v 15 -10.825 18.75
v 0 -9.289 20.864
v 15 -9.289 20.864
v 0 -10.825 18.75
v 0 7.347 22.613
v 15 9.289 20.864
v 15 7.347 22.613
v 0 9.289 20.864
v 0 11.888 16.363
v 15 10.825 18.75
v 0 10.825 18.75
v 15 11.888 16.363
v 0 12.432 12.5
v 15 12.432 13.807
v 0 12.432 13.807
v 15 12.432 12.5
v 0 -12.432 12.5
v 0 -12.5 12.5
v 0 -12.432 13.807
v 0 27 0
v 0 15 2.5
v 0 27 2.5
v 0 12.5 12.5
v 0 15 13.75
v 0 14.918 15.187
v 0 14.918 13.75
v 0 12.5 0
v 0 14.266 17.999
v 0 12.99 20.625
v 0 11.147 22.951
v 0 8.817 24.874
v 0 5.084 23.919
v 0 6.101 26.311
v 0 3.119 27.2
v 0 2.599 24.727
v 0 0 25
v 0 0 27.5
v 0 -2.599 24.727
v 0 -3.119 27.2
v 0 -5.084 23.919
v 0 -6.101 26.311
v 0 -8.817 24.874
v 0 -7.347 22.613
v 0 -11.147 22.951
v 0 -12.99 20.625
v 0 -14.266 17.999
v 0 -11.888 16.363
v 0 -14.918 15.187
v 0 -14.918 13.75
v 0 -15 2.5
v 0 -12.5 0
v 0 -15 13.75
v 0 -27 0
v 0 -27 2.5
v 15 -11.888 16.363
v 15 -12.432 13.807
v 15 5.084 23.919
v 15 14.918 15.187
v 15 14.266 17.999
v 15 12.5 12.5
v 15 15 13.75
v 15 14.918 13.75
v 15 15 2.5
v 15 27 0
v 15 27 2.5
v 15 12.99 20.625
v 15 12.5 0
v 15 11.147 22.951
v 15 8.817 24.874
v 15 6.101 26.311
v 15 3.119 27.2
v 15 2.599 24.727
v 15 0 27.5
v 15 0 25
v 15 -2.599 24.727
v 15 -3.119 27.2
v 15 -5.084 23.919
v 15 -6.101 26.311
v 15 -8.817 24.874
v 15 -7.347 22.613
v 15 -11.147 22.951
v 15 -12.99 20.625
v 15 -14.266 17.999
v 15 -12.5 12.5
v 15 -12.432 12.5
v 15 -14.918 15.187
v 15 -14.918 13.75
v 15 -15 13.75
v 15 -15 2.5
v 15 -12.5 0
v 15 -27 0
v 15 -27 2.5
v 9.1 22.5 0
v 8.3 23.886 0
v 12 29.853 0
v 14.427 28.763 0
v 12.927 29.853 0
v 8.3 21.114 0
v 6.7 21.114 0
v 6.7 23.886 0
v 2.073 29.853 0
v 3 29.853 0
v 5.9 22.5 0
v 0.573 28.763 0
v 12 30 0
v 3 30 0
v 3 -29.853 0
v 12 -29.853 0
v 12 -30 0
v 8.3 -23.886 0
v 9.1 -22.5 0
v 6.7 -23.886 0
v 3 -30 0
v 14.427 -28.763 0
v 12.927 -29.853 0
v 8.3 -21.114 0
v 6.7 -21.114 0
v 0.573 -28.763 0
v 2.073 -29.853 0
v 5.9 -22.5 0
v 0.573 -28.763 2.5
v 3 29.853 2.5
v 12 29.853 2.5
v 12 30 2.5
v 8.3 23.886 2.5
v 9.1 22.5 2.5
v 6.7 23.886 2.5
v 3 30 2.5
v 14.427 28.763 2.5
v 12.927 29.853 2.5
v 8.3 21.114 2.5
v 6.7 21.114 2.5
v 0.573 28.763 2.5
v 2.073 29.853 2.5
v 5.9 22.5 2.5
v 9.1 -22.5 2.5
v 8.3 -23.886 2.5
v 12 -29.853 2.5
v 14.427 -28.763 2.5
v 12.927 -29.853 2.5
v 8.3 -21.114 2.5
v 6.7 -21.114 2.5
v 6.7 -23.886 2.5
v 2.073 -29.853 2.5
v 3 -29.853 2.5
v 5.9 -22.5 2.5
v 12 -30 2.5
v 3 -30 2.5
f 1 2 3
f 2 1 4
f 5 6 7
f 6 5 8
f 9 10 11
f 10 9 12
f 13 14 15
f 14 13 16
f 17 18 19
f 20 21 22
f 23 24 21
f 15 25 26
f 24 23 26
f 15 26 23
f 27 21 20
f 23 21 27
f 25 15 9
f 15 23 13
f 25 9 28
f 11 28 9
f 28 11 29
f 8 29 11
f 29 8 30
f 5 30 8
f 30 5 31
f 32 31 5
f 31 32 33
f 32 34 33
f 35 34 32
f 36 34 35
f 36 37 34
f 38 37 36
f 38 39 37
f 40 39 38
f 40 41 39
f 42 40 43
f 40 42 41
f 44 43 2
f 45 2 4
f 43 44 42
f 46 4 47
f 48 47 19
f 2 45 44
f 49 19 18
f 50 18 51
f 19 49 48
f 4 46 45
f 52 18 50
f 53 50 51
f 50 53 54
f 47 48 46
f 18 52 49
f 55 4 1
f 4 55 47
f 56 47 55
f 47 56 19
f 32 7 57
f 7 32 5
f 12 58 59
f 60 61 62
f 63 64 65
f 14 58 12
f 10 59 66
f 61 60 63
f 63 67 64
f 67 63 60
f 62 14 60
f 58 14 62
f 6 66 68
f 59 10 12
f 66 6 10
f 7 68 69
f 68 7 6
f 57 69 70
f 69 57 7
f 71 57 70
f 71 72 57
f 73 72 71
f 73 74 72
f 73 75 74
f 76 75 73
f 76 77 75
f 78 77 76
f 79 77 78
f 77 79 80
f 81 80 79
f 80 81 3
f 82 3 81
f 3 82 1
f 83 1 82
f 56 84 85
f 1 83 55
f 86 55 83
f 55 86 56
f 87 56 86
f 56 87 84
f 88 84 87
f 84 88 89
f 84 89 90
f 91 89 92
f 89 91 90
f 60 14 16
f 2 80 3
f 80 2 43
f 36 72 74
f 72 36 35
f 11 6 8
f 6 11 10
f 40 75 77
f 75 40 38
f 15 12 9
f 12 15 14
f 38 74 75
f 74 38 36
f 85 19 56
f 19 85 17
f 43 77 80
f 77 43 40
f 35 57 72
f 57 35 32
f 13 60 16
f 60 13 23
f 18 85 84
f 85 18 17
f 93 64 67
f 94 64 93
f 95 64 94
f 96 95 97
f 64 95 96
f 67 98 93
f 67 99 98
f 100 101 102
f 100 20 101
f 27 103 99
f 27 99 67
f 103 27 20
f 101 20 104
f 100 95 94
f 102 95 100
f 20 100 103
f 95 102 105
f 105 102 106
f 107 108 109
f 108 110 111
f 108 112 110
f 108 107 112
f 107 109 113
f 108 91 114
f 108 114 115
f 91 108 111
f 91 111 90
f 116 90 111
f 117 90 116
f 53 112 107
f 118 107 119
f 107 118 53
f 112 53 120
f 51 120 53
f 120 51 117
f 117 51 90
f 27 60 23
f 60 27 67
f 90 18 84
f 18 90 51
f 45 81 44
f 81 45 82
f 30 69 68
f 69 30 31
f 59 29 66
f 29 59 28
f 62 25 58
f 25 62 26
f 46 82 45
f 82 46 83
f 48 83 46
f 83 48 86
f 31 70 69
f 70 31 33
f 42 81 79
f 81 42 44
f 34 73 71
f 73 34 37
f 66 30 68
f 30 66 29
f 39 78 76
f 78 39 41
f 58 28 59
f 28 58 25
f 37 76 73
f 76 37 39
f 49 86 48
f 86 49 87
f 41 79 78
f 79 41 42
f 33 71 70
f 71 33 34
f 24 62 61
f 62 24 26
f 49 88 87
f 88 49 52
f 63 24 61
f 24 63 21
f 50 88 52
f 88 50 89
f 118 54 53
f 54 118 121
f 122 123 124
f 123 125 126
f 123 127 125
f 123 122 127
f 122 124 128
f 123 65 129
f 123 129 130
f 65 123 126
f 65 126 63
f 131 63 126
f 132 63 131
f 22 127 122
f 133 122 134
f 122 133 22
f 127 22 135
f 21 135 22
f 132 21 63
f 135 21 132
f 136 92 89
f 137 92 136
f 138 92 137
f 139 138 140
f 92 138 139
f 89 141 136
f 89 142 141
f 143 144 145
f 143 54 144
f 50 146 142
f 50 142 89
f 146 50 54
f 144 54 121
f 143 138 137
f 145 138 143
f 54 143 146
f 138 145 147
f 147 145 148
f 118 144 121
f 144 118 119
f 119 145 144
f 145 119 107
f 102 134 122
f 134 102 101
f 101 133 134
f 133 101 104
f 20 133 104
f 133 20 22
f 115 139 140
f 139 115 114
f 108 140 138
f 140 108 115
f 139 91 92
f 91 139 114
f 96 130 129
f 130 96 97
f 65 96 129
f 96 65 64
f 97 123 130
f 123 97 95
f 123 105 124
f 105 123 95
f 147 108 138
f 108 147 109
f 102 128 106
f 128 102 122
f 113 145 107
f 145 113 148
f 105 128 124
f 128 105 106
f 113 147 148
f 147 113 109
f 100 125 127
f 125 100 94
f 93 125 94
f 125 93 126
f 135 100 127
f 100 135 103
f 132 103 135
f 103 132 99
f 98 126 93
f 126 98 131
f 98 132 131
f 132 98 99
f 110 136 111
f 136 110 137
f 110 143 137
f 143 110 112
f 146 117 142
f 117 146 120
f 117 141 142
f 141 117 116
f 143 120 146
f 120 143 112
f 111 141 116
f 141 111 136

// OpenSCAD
// file: utils.scad
module mirror_copy(v = [1,0,0]) {
    children();
    mirror(v) {
        children();
    }
}

module rounded_rect(size, r, center=false) {
    module _shape() {
        hull() {
            translate([r, r]) circle(r);
            translate([size.x - r, r]) circle(r);
            translate([r, size.y - r]) circle(r);
            translate([size.x - r, size.y - r]) circle(r);
        }
    }
    if (!center)
        _shape();
    else 
        translate([-size.x/2, -size.y/2]) _shape();
}
// file: params.scad
e = 0.01;  // epsilon
m3_d = 3.2;  // hole diameter for an M3 screw
corner_r = 3; // corner radius

plate_thickness = 4;
// positions of the wheel/motor mountings (not the wheels themselves)
back_wheel_pos = [53, 0];
front_wheel_pos = [52.25, 172.78];

// Widths on the plate are measured from the main axis => they are halved!

// the back plate on which the motors and back wheels are mounted;
// needs to be long enough for the wheels to fit
back_plate_length = 36*2;
// the plate on which the battery is mounted
middle_plate_width = 75;
// width of the cutout behind and in front of the front wheels for them to
// steer freely
steering_cutout_width = 35;
battery_width = 32;

motor_d = 25;
motor_len = 47.8;
motor_holder_len = 15;
motor_holder_screw_hole_margin = (motor_holder_len - m3_d) / 2;
motor_bracket_thickness = 2.5;
// main file
include <params.scad>
use <utils.scad>
use <MCAD/boxes.scad>

thickness = motor_bracket_thickness;
screw_hole_margin = motor_holder_screw_hole_margin;

// a cube with a cylinder on top
module _base_solid_shape() {
    translate([0, 0, motor_d/2]) rotate([0, 90, 0]) cylinder(d = motor_d, h = motor_holder_len);
    translate([0, -motor_d/2, 0]) cube([motor_holder_len, motor_d, motor_d/2]);
}

// obtain a shell by subtracting two scaled copies of _base_solid_shape
// (TODO: would using cylinder_tube from MCAD/regular_shapes be simpler?)
difference() {
    union() {
        resize([motor_holder_len, motor_d+thickness*2, motor_d+thickness]) _base_solid_shape();

        // feet
        translate([motor_holder_len/2, 0, thickness/2])
            roundedBox(
                [motor_holder_len, motor_d + 2*(thickness + m3_d + 2*screw_hole_margin), thickness],
                radius = corner_r,
                sidesonly = true
            );
    }

    _base_solid_shape();
    // screw holes
    mirror_copy([0,1,0])
        translate([
            motor_holder_len/2,
            motor_d/2 + thickness + screw_hole_margin + m3_d/2,
            0-e
        ])
            cylinder(d=m3_d, h=thickness+2*e);
}
